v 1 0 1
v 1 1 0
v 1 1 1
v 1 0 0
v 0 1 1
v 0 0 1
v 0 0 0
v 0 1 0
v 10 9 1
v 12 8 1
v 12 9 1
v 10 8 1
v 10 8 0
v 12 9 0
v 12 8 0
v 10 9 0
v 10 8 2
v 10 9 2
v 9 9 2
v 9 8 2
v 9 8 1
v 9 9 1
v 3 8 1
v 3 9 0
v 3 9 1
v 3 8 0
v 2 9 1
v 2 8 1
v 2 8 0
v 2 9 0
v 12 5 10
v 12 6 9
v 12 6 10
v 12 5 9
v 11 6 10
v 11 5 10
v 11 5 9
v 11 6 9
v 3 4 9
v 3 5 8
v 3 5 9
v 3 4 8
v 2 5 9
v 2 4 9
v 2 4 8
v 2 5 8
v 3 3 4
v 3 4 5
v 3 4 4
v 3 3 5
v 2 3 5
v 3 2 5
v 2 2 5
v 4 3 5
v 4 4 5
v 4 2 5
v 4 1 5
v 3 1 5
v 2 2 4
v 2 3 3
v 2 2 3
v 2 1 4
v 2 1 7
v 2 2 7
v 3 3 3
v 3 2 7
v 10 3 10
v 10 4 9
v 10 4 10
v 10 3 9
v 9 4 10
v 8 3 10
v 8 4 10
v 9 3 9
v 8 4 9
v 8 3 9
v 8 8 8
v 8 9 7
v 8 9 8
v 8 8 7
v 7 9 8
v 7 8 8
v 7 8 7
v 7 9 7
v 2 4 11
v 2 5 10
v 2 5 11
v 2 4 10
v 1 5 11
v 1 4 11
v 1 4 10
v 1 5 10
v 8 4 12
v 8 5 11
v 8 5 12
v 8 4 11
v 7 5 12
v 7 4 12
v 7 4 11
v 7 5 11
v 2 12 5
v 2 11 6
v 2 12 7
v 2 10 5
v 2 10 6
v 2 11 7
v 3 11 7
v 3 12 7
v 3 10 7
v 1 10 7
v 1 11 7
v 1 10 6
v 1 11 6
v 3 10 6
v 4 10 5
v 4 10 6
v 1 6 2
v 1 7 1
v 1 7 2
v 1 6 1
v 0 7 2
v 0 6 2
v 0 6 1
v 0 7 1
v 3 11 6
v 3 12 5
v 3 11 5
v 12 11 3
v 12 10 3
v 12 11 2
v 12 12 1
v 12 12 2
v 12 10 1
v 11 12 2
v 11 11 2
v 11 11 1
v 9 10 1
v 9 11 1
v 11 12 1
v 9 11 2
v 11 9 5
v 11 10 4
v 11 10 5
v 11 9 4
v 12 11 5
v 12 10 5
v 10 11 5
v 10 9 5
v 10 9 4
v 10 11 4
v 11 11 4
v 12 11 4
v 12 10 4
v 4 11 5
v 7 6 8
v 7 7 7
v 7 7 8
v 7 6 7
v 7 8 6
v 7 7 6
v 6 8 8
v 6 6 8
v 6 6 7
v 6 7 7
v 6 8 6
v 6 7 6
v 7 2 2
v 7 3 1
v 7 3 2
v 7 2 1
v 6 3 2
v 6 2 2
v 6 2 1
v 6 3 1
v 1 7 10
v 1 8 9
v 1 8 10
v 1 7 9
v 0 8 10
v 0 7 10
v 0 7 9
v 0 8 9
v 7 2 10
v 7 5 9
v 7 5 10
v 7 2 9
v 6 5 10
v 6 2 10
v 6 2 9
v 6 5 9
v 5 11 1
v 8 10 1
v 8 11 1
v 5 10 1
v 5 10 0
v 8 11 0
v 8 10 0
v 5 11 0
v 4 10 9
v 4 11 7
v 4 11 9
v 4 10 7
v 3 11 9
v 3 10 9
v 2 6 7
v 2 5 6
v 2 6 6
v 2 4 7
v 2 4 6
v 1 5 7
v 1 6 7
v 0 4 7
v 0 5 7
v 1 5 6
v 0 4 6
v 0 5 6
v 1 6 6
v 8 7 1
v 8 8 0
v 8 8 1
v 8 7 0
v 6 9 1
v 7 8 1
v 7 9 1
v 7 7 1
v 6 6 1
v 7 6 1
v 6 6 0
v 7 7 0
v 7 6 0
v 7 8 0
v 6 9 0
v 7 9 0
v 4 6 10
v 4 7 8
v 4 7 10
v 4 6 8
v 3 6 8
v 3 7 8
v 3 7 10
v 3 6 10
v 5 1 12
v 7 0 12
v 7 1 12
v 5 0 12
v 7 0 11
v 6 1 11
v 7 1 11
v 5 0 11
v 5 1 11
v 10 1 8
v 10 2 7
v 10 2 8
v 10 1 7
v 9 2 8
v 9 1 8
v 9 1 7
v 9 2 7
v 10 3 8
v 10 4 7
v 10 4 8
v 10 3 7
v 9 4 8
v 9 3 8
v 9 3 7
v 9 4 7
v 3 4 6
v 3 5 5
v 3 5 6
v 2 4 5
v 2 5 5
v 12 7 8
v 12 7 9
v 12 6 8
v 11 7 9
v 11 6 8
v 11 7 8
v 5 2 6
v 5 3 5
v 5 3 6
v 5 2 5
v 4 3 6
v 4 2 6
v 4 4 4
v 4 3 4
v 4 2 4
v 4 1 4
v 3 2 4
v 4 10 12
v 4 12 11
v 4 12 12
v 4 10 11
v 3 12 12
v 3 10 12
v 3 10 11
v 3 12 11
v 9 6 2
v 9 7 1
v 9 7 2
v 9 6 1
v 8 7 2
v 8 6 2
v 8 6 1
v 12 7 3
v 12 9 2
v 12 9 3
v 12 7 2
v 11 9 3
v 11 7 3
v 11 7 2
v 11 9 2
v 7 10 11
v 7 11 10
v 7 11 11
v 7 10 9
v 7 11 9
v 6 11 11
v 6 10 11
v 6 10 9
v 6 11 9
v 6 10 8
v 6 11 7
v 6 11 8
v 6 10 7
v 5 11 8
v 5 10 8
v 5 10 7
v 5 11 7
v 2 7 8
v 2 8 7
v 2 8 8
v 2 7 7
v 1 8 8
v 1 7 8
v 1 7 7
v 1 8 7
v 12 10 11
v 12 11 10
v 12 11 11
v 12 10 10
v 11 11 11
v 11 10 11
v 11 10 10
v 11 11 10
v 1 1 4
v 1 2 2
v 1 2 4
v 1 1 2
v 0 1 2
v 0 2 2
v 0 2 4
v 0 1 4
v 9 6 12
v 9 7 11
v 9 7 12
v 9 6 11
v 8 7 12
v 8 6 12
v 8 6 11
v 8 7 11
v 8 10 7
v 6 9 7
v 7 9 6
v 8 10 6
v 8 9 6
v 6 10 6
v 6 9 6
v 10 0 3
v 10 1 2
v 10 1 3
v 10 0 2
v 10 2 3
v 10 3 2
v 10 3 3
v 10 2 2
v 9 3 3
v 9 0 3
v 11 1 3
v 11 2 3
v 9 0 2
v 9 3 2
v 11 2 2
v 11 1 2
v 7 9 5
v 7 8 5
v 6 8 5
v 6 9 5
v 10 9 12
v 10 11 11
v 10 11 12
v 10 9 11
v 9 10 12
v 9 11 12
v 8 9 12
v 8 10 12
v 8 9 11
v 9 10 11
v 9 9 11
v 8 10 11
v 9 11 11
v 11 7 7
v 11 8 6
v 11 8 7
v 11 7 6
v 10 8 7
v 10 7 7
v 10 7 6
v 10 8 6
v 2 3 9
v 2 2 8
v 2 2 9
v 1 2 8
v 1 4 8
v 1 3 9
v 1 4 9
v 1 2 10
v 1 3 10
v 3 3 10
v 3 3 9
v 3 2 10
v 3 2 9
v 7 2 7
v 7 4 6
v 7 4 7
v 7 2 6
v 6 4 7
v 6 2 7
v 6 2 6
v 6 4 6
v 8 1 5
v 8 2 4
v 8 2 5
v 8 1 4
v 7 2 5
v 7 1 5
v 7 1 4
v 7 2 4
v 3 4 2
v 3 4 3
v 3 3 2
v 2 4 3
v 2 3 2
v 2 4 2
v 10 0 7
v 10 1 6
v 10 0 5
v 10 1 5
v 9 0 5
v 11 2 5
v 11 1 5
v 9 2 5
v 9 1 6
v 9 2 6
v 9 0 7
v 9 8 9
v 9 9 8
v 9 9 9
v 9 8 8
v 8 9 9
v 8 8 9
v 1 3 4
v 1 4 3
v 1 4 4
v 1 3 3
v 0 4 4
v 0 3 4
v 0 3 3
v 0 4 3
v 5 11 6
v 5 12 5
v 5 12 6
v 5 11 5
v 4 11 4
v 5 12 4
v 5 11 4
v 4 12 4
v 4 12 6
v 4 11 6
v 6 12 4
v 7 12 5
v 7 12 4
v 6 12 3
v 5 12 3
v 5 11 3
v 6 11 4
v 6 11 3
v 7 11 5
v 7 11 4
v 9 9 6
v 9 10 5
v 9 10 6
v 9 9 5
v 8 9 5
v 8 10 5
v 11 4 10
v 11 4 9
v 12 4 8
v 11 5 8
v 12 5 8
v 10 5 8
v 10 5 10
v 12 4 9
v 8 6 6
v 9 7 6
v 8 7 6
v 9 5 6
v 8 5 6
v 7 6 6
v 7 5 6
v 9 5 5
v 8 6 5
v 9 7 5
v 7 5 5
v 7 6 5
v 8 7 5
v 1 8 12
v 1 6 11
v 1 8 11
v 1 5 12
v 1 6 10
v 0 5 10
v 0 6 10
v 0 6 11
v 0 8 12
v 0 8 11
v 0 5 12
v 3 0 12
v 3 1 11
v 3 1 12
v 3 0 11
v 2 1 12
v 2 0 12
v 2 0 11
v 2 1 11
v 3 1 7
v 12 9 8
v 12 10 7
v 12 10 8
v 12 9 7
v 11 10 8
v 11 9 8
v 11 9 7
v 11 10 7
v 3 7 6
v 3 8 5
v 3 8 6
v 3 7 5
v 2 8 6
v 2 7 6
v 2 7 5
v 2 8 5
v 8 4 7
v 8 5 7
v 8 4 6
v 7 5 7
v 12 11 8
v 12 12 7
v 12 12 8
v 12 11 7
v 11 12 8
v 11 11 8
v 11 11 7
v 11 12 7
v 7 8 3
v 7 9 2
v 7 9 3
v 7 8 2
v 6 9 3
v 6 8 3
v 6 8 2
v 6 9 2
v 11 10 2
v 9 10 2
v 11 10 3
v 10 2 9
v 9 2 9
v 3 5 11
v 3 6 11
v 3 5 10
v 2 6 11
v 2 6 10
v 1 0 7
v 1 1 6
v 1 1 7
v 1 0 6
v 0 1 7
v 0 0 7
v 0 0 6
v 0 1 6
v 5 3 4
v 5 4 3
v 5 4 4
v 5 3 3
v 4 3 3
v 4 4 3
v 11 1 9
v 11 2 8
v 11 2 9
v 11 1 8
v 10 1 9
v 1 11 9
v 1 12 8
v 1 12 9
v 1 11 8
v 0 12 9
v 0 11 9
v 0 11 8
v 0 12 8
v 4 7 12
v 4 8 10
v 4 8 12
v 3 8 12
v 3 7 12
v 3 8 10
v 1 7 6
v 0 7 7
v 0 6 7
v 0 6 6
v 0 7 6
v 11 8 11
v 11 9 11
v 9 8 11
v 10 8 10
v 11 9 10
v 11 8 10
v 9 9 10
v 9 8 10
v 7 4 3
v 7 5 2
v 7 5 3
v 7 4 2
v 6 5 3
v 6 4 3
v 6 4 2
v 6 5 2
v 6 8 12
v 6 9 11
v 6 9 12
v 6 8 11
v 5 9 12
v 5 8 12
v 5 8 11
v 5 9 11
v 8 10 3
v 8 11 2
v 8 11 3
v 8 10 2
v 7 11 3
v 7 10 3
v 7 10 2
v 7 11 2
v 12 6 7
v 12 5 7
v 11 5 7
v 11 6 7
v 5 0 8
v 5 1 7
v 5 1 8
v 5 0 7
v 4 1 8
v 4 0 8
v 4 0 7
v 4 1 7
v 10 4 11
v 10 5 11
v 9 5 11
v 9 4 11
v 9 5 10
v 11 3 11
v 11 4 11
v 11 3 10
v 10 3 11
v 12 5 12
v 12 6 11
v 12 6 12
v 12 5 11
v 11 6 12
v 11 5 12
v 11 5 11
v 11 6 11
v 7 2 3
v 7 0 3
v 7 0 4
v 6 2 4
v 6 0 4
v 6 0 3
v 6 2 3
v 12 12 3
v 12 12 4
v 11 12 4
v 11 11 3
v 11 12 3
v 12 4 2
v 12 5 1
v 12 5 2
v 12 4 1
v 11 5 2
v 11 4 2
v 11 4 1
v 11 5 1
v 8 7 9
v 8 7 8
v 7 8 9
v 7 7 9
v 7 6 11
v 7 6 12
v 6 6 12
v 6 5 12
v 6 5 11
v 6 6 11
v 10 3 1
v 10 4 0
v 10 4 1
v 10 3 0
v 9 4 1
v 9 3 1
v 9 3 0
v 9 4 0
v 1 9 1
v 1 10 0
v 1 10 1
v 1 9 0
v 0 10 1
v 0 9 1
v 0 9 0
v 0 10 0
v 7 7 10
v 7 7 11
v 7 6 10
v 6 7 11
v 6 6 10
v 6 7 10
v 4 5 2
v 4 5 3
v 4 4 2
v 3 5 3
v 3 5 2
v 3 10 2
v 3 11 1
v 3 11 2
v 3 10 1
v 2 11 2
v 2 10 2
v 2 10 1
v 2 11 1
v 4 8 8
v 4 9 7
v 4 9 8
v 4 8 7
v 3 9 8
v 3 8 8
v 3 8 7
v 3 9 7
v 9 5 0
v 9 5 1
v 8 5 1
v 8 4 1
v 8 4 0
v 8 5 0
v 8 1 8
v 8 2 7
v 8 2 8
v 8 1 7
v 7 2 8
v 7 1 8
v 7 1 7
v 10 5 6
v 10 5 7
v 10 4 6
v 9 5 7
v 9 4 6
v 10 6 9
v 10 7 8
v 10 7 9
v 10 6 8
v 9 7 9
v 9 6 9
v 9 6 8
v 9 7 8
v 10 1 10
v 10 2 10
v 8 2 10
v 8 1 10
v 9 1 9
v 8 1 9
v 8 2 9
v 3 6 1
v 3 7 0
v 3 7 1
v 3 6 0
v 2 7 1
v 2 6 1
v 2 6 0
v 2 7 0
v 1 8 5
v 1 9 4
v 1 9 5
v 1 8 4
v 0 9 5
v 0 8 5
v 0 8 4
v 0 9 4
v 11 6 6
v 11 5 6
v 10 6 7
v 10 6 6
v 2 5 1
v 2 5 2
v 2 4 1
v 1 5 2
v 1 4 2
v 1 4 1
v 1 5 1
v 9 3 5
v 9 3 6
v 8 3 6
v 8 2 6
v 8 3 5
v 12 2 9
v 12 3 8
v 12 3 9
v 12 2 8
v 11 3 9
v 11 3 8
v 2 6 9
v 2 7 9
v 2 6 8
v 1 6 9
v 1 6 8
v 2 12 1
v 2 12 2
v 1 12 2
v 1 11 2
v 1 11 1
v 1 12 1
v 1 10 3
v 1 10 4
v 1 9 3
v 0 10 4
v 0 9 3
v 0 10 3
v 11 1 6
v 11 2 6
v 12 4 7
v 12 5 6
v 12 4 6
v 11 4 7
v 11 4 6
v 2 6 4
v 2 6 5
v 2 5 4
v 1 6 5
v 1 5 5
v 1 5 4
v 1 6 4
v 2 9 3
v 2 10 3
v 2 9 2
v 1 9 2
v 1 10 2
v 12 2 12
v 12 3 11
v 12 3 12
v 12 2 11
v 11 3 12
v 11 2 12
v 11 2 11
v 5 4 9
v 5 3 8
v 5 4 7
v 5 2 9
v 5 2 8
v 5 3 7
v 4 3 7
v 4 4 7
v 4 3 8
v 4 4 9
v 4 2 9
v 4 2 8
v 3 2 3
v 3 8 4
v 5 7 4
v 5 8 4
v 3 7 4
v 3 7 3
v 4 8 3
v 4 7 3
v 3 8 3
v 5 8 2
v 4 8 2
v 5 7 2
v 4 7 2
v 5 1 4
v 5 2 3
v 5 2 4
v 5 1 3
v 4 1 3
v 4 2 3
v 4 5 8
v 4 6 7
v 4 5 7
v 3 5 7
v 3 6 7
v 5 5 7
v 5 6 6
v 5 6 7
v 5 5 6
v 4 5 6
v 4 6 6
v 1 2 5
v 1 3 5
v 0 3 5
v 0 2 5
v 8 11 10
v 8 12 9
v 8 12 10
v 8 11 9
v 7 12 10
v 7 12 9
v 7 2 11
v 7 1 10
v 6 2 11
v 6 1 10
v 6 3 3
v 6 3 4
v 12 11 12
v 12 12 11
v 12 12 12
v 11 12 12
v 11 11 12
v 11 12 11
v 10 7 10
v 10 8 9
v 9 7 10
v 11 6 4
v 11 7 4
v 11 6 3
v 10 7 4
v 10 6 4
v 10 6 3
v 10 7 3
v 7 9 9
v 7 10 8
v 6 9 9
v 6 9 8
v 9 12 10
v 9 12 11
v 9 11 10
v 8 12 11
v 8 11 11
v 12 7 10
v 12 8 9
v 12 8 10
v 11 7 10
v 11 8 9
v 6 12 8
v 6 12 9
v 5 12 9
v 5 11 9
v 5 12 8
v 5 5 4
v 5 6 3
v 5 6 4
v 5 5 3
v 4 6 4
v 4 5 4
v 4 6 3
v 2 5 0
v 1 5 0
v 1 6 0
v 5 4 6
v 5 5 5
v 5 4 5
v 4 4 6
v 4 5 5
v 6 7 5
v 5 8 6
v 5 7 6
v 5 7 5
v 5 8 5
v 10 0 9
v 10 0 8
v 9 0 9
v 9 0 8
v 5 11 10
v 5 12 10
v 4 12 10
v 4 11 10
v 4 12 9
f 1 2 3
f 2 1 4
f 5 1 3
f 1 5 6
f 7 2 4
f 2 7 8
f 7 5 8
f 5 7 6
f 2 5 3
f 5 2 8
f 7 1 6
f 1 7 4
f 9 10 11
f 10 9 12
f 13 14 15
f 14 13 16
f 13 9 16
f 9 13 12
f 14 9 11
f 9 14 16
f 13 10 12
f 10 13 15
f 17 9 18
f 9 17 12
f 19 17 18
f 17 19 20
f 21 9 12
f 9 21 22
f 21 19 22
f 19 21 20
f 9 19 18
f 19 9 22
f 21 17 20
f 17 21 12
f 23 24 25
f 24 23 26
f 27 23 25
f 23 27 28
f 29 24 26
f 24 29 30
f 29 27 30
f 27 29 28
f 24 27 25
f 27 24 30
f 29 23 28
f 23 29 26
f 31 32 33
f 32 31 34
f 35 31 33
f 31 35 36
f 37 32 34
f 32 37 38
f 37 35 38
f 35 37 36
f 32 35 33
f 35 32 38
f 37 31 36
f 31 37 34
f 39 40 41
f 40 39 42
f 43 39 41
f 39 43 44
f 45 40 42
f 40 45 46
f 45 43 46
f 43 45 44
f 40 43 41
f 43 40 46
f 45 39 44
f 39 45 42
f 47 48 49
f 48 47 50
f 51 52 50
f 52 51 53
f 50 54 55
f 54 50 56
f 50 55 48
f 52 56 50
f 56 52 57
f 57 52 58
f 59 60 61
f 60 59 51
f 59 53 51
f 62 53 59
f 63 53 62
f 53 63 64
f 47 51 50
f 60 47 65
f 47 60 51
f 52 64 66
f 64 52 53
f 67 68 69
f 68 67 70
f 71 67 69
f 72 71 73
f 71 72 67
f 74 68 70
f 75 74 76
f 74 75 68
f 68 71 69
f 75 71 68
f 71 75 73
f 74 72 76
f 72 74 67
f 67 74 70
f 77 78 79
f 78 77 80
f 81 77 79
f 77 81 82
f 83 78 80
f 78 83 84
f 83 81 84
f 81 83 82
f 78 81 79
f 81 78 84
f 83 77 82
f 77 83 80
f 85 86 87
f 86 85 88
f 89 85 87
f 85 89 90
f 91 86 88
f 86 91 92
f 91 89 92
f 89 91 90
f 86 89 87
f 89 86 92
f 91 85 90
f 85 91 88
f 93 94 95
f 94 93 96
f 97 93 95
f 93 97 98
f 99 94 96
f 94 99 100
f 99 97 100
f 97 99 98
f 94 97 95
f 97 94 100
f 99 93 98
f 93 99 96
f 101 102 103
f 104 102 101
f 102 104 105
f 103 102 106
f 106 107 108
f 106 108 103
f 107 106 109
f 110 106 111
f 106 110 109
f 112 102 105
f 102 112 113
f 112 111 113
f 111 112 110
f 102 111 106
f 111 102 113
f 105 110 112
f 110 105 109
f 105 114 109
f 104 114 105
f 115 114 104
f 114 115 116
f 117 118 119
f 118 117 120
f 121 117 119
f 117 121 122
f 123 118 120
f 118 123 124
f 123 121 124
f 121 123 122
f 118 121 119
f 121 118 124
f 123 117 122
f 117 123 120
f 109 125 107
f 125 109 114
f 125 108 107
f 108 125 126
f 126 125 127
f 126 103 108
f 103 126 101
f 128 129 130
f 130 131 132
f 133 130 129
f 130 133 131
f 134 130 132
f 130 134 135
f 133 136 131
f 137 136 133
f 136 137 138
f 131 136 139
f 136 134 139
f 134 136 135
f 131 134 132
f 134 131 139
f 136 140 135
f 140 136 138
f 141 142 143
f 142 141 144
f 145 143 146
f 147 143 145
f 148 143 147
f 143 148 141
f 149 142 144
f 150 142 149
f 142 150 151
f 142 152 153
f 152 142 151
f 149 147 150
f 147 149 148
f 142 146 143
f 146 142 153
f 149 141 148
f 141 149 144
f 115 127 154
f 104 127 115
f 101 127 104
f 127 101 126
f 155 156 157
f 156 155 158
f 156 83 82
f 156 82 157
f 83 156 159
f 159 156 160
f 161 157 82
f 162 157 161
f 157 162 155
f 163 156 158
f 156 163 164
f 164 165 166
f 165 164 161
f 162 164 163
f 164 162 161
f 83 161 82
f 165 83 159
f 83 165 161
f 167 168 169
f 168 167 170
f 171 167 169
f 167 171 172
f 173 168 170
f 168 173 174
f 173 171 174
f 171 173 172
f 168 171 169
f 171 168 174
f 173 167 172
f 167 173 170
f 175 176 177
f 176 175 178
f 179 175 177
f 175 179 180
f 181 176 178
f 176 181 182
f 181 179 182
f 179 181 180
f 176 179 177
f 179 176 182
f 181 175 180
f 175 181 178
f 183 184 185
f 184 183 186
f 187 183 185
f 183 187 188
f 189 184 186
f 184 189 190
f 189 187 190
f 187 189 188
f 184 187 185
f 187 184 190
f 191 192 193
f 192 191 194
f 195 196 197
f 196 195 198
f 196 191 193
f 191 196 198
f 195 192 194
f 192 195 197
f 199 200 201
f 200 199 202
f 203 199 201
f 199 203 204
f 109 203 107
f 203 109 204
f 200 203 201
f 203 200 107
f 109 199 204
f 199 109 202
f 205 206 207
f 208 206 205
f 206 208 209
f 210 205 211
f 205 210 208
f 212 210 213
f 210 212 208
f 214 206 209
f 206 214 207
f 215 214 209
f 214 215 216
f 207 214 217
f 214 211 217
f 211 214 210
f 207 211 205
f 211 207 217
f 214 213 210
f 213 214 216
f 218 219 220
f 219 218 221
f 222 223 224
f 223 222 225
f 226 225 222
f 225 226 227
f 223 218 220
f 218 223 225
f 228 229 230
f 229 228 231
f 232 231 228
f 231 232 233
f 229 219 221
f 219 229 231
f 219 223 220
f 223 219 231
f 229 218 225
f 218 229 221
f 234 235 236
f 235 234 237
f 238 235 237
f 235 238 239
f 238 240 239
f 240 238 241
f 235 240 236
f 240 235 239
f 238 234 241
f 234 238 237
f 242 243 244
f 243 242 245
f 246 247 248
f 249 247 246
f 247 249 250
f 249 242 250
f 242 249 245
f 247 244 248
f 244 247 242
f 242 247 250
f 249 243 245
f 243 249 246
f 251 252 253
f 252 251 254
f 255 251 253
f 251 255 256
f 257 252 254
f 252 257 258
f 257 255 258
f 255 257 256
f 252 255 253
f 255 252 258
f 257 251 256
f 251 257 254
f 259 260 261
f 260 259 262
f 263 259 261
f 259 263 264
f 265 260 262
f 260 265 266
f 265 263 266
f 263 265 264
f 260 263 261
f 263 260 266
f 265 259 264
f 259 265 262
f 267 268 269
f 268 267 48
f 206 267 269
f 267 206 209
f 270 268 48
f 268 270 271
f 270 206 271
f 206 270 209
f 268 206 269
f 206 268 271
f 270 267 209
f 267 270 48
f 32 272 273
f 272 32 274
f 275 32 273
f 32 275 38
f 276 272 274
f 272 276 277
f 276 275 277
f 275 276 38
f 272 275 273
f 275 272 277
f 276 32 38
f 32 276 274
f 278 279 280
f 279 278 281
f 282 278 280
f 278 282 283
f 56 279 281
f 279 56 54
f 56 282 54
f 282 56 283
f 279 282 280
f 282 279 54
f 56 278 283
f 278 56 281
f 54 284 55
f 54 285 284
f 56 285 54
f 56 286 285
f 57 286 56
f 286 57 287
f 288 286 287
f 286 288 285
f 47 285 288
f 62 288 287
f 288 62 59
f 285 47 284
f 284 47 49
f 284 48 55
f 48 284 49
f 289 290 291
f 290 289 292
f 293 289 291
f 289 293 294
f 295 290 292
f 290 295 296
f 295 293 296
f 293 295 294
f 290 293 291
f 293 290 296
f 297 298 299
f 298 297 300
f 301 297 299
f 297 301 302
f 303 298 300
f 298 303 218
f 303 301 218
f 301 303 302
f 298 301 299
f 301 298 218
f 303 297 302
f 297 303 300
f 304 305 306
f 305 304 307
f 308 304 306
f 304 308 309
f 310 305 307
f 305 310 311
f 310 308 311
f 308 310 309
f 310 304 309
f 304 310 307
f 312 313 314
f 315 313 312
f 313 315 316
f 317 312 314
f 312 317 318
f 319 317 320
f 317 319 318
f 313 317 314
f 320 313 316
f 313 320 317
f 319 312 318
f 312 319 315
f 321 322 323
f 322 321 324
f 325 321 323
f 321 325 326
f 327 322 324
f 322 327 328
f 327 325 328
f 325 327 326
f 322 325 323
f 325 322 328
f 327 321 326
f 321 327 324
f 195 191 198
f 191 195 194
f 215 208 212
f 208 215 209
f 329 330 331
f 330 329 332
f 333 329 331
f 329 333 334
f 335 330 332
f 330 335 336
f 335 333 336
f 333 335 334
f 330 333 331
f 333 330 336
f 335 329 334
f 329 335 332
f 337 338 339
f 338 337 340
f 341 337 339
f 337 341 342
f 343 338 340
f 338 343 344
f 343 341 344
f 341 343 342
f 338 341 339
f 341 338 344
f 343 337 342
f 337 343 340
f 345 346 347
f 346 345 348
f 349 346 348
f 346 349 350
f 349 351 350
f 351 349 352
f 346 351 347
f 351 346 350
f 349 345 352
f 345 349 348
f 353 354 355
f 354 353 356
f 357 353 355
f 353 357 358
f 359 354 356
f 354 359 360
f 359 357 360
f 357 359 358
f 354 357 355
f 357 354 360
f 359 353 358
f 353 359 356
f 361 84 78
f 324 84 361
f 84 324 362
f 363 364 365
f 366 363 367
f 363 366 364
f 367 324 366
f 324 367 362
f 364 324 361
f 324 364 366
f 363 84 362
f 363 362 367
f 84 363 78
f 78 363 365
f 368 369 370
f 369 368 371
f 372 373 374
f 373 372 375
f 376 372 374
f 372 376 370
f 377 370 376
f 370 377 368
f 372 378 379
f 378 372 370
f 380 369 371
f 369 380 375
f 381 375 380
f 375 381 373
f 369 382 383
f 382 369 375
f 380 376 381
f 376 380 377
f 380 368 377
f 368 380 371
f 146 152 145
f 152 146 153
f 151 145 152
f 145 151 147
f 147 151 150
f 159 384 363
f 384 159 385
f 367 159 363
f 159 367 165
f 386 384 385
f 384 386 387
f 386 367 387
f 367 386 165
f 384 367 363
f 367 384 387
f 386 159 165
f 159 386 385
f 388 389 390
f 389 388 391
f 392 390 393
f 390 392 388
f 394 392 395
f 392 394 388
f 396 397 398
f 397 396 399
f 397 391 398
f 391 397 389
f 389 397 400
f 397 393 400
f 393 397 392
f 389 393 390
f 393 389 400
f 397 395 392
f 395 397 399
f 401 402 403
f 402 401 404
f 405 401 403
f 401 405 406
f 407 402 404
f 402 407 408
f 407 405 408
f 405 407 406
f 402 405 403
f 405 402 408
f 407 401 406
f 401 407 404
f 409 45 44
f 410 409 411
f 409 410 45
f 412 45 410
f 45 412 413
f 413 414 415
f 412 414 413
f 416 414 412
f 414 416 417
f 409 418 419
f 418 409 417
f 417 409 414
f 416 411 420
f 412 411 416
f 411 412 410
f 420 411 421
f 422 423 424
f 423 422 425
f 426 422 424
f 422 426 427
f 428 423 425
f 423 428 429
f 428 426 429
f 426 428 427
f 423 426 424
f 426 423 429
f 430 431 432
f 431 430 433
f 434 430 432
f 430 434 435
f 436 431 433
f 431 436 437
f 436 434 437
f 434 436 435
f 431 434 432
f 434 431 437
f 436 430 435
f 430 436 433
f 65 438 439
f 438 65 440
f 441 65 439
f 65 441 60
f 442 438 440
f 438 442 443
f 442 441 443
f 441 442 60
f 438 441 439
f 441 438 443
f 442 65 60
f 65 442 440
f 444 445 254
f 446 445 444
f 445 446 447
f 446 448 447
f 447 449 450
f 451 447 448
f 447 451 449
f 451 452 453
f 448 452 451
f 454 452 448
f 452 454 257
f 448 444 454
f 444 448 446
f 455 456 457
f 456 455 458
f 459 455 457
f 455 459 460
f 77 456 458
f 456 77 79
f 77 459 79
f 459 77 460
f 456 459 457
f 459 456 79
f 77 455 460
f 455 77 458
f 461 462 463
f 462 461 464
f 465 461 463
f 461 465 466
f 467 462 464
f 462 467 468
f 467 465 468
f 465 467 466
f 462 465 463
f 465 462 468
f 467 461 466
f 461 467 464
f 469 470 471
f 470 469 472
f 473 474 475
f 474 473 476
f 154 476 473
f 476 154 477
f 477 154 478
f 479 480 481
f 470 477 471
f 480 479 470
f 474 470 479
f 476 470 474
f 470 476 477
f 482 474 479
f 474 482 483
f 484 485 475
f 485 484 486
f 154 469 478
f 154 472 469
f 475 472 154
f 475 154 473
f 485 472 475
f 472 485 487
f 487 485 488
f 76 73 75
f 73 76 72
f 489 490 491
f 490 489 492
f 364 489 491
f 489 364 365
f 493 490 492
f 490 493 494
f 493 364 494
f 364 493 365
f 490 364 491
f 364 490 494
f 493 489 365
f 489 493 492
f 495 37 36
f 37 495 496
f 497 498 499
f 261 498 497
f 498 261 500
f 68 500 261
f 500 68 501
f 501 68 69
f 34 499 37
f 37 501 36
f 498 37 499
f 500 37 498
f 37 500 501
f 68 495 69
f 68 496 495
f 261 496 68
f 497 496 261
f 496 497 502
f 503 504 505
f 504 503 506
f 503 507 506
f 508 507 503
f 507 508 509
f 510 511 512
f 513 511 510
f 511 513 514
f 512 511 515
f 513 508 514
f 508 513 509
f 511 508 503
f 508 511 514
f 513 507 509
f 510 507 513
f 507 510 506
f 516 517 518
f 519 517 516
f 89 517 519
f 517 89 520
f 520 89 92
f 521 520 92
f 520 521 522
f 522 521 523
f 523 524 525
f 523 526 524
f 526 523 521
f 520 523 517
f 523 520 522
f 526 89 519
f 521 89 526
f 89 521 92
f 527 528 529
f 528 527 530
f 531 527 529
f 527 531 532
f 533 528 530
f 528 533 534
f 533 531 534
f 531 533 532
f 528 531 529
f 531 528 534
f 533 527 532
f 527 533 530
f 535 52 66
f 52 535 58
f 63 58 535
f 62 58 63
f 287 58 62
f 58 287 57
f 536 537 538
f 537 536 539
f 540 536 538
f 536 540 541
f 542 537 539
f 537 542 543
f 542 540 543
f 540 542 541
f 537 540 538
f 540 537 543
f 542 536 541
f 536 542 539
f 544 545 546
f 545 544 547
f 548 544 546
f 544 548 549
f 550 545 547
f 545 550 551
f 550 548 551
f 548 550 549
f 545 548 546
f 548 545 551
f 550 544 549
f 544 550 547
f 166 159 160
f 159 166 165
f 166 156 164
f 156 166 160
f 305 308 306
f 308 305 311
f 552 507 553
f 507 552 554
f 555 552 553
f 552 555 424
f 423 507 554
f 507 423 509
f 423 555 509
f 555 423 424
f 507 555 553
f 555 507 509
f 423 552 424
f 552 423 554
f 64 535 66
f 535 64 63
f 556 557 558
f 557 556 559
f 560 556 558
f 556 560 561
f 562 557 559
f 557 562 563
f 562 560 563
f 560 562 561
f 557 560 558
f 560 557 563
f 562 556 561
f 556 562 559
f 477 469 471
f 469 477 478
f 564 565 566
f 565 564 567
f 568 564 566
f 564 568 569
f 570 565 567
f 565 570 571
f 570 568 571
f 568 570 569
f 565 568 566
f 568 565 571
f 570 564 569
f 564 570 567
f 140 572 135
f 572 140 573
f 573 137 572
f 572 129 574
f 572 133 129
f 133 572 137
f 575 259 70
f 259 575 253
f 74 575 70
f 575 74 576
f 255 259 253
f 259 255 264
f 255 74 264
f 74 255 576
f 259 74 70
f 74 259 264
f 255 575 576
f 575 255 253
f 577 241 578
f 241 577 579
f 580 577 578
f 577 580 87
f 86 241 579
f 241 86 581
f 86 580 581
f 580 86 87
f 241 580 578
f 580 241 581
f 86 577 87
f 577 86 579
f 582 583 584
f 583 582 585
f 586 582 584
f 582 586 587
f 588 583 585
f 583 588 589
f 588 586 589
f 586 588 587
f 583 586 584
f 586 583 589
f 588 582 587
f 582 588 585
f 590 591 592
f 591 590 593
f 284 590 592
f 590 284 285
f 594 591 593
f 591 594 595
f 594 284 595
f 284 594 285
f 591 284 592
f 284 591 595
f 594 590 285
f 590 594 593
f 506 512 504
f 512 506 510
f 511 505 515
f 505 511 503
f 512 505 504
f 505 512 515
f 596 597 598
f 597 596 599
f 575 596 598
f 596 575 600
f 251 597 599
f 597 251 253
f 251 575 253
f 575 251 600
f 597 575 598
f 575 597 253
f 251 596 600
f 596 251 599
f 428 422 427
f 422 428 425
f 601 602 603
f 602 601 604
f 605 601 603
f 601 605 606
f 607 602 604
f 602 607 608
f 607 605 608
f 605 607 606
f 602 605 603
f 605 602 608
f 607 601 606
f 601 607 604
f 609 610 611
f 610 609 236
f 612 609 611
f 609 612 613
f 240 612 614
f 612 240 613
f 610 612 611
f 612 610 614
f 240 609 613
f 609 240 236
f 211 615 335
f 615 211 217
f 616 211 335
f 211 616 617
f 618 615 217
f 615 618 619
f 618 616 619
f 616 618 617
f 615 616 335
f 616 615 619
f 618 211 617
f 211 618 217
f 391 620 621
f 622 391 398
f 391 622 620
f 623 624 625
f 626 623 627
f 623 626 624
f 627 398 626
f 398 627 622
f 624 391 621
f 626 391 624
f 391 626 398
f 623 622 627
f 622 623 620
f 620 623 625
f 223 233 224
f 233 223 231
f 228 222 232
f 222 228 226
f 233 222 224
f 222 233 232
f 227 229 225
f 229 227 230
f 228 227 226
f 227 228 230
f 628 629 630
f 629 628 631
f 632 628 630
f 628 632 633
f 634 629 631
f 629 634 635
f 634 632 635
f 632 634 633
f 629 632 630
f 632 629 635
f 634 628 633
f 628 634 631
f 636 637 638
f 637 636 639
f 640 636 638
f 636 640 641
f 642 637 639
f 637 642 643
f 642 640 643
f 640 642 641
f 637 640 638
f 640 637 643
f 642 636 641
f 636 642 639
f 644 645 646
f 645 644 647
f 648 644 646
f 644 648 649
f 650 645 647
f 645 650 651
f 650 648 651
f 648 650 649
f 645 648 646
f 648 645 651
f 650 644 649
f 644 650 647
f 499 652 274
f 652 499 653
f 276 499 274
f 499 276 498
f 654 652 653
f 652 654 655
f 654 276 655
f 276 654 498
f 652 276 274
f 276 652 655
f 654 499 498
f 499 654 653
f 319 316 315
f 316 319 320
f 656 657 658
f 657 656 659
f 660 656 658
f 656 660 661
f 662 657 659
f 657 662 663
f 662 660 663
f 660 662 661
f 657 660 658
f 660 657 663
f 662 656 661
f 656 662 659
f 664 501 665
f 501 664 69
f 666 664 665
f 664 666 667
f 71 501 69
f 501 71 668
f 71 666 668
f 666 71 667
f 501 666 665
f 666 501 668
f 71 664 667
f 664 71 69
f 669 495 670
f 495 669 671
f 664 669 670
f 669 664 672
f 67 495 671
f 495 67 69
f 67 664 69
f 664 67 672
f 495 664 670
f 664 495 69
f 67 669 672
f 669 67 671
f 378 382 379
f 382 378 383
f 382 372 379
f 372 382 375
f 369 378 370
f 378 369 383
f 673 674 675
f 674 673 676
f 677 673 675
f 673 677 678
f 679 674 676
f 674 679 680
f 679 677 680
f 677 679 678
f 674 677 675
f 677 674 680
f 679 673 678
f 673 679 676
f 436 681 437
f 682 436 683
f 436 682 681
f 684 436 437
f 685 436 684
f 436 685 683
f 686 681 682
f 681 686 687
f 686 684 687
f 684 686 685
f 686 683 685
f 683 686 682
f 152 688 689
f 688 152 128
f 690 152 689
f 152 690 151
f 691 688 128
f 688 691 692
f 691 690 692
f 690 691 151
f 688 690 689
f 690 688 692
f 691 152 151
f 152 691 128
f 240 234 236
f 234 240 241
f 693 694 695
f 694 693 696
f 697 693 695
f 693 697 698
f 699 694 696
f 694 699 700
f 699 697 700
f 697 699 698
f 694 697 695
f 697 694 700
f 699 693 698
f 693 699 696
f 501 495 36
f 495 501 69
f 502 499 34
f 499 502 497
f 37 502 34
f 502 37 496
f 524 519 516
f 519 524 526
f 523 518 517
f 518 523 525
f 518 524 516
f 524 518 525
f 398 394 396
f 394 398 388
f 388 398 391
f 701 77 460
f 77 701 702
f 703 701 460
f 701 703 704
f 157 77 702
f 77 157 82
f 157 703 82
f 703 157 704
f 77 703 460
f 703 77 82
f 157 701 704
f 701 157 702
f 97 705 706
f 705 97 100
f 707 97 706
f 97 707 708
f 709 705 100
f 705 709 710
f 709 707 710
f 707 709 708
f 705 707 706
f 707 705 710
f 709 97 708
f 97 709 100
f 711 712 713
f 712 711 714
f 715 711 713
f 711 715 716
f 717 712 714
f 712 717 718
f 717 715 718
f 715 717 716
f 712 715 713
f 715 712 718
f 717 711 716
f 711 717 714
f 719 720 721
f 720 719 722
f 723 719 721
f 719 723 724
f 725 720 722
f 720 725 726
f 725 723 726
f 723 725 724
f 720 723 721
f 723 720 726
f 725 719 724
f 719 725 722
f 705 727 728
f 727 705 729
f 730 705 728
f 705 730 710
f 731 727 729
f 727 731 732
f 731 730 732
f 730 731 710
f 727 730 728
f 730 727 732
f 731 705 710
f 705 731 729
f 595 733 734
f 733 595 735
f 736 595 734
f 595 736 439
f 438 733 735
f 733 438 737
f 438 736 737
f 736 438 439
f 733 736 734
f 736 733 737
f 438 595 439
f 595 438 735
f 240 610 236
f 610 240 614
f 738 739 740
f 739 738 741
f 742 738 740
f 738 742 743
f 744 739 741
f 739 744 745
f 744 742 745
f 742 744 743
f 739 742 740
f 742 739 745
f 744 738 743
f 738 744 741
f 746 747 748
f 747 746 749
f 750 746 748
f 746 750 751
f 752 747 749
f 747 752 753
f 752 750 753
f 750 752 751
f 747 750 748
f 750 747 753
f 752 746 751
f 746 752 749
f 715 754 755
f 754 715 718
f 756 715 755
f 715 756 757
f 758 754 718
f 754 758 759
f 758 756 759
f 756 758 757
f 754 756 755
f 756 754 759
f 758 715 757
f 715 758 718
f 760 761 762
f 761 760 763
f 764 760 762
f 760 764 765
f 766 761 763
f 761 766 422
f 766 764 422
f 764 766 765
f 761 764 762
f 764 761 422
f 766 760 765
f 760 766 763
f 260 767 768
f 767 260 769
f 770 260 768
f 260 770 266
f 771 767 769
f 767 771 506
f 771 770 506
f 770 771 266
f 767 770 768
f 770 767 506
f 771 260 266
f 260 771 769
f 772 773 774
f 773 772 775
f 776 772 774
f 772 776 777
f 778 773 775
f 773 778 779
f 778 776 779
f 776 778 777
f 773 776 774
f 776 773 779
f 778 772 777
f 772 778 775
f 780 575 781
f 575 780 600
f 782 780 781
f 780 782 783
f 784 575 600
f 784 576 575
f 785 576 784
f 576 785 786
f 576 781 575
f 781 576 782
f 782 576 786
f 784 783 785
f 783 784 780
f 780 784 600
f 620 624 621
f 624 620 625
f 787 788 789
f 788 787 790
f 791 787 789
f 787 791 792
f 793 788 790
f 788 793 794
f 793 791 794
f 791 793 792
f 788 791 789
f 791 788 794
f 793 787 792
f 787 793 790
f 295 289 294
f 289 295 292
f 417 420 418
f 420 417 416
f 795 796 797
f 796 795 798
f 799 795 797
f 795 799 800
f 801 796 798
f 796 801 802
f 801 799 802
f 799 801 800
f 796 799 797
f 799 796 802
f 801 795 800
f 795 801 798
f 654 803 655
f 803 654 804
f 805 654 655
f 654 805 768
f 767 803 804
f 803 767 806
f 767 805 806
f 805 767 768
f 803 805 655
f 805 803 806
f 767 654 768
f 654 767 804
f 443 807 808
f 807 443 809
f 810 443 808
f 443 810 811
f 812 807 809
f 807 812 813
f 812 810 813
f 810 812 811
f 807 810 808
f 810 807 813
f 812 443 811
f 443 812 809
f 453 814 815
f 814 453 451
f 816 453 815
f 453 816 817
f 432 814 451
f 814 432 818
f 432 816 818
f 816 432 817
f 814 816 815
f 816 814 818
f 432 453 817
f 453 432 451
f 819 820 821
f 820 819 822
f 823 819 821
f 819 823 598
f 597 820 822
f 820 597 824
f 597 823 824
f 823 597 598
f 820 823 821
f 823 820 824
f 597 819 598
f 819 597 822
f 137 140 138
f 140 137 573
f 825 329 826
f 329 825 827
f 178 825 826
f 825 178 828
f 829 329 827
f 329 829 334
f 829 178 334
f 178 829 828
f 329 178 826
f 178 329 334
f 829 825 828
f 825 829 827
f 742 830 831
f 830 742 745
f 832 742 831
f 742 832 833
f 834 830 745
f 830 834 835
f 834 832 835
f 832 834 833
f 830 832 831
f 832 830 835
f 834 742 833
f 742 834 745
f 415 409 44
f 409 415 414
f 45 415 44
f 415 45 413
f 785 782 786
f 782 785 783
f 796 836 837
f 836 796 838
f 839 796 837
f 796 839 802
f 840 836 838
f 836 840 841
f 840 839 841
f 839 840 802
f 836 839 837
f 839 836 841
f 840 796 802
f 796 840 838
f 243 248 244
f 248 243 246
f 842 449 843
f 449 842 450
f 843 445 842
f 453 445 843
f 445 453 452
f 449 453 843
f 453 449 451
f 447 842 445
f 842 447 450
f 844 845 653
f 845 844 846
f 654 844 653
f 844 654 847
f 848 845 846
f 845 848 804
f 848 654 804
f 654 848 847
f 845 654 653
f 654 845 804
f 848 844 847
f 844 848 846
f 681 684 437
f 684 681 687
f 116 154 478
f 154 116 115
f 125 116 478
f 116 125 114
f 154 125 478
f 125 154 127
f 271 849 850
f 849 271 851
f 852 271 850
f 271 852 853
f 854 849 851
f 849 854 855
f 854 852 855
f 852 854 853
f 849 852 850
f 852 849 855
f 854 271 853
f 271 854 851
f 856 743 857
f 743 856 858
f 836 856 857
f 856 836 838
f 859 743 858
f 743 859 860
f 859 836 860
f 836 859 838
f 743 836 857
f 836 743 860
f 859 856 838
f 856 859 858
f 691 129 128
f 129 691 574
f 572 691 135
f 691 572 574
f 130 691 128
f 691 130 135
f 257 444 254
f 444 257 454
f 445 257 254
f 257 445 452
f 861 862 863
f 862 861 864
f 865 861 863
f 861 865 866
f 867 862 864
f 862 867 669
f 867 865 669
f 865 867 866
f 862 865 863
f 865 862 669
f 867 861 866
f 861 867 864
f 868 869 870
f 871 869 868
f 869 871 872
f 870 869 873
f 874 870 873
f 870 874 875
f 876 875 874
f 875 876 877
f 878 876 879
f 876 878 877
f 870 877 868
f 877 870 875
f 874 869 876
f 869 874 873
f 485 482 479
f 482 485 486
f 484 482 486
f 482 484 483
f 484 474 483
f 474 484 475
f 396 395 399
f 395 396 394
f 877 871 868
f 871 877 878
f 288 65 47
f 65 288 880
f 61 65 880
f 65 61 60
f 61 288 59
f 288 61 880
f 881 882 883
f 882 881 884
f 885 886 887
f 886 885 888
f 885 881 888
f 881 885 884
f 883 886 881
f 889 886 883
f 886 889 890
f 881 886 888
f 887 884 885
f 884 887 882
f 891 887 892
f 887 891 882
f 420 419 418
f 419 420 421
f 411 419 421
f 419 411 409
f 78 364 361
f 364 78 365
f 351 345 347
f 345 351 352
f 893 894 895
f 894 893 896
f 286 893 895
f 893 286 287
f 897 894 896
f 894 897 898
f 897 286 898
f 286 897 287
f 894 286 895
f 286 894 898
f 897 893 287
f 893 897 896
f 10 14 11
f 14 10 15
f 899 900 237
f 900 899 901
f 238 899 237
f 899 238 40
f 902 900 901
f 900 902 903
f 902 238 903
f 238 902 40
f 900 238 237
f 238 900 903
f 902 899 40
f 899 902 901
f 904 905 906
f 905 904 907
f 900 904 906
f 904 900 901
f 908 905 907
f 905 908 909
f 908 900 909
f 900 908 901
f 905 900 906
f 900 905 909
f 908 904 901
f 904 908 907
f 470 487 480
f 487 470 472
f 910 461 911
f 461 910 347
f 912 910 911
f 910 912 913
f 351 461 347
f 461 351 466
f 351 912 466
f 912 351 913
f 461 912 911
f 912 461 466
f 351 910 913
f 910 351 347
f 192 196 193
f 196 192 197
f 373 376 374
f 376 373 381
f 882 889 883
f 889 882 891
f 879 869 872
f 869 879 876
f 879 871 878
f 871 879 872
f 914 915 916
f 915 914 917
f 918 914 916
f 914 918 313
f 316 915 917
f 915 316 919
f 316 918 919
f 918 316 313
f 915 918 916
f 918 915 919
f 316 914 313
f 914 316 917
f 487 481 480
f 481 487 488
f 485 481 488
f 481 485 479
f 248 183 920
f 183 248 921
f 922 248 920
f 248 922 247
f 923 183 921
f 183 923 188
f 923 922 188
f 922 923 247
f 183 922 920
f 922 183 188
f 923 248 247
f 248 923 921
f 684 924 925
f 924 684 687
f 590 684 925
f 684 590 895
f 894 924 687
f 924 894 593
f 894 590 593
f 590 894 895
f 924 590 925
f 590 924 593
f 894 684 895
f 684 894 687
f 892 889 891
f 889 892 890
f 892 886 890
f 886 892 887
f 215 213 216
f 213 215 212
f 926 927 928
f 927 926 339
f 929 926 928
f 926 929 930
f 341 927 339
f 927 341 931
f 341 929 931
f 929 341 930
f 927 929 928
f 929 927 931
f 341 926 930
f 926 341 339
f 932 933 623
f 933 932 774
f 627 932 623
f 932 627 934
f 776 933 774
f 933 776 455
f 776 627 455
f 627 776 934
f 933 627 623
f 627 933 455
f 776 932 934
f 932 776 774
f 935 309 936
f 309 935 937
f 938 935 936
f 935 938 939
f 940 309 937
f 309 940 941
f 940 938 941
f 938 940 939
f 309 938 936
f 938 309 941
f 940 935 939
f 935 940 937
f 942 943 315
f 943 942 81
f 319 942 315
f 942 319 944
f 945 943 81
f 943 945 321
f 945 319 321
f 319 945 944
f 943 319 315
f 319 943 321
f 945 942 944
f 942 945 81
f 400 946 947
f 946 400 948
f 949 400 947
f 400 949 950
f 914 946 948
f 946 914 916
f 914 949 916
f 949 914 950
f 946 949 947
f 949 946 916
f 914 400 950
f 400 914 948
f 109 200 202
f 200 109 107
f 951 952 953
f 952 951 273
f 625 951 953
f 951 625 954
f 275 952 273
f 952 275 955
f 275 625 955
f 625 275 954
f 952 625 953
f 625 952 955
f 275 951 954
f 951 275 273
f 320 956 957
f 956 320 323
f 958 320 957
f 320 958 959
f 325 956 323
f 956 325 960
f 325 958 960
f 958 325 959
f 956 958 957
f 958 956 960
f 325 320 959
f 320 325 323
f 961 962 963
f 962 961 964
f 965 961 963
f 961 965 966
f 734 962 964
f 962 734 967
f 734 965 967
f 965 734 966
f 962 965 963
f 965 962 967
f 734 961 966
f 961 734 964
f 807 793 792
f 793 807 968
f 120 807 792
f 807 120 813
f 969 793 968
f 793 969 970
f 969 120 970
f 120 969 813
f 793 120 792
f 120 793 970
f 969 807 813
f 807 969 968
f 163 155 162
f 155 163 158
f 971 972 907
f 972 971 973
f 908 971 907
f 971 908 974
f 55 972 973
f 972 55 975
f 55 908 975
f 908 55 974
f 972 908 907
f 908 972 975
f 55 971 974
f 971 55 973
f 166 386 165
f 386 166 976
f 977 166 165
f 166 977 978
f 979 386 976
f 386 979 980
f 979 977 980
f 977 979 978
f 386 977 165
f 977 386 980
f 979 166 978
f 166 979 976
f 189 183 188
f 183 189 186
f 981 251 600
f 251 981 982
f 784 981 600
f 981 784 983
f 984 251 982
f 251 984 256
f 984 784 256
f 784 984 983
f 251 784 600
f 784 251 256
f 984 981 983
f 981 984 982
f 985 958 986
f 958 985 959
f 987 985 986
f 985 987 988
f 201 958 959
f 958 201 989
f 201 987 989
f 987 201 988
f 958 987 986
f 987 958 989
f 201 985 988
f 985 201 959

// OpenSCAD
union() {
    translate([0, 0, 0]) cube([1, 1, 1]);
    translate([10, 8, 0]) cube([1, 1, 1]);
    translate([9, 8, 1]) cube([1, 1, 1]);
    translate([2, 8, 0]) cube([1, 1, 1]);
    translate([11, 5, 9]) cube([1, 1, 1]);
    translate([2, 4, 8]) cube([1, 1, 1]);
    translate([2, 2, 4]) cube([1, 1, 1]);
    translate([9, 3, 9]) cube([1, 1, 1]);
    translate([7, 8, 7]) cube([1, 1, 1]);
    translate([1, 4, 10]) cube([1, 1, 1]);
    translate([7, 4, 11]) cube([1, 1, 1]);
    translate([1, 10, 6]) cube([1, 1, 1]);
    translate([0, 6, 1]) cube([1, 1, 1]);
    translate([2, 11, 6]) cube([1, 1, 1]);
    translate([11, 11, 1]) cube([1, 1, 1]);
    translate([10, 9, 4]) cube([1, 1, 1]);
    translate([2, 10, 5]) cube([1, 1, 1]);
    translate([6, 7, 7]) cube([1, 1, 1]);
    translate([6, 2, 1]) cube([1, 1, 1]);
    translate([0, 7, 9]) cube([1, 1, 1]);
    translate([6, 4, 9]) cube([1, 1, 1]);
    translate([6, 10, 0]) cube([1, 1, 1]);
    translate([3, 10, 8]) cube([1, 1, 1]);
    translate([1, 5, 6]) cube([1, 1, 1]);
    translate([7, 7, 0]) cube([1, 1, 1]);
    translate([3, 6, 8]) cube([1, 1, 1]);
    translate([5, 0, 11]) cube([1, 1, 1]);
    translate([9, 1, 7]) cube([1, 1, 1]);
    translate([9, 3, 7]) cube([1, 1, 1]);
    translate([2, 4, 5]) cube([1, 1, 1]);
    translate([11, 6, 8]) cube([1, 1, 1]);
    translate([4, 2, 5]) cube([1, 1, 1]);
    translate([3, 3, 4]) cube([1, 1, 1]);
    translate([3, 11, 11]) cube([1, 1, 1]);
    translate([6, 3, 9]) cube([1, 1, 1]);
    translate([8, 6, 1]) cube([1, 1, 1]);
    translate([11, 7, 2]) cube([1, 1, 1]);
    translate([6, 10, 10]) cube([1, 1, 1]);
    translate([5, 10, 7]) cube([1, 1, 1]);
    translate([5, 10, 0]) cube([1, 1, 1]);
    translate([1, 4, 6]) cube([1, 1, 1]);
    translate([1, 7, 7]) cube([1, 1, 1]);
    translate([11, 10, 10]) cube([1, 1, 1]);
    translate([0, 1, 2]) cube([1, 1, 1]);
    translate([8, 6, 11]) cube([1, 1, 1]);
    translate([6, 9, 6]) cube([1, 1, 1]);
    translate([9, 0, 2]) cube([1, 1, 1]);
    translate([11, 10, 4]) cube([1, 1, 1]);
    translate([6, 8, 5]) cube([1, 1, 1]);
    translate([9, 10, 11]) cube([1, 1, 1]);
    translate([10, 7, 6]) cube([1, 1, 1]);
    translate([1, 2, 8]) cube([1, 1, 1]);
    translate([6, 3, 6]) cube([1, 1, 1]);
    translate([7, 1, 4]) cube([1, 1, 1]);
    translate([2, 3, 2]) cube([1, 1, 1]);
    translate([9, 0, 5]) cube([1, 1, 1]);
    translate([8, 8, 8]) cube([1, 1, 1]);
    translate([0, 3, 3]) cube([1, 1, 1]);
    translate([4, 11, 4]) cube([1, 1, 1]);
    translate([8, 3, 9]) cube([1, 1, 1]);
    translate([8, 9, 5]) cube([1, 1, 1]);
    translate([10, 4, 8]) cube([1, 1, 1]);
    translate([7, 5, 5]) cube([1, 1, 1]);
    translate([0, 5, 10]) cube([1, 1, 1]);
    translate([2, 0, 11]) cube([1, 1, 1]);
    translate([3, 1, 4]) cube([1, 1, 1]);
    translate([11, 9, 7]) cube([1, 1, 1]);
    translate([2, 7, 5]) cube([1, 1, 1]);
    translate([6, 7, 6]) cube([1, 1, 1]);
    translate([11, 8, 2]) cube([1, 1, 1]);
    translate([2, 11, 5]) cube([1, 1, 1]);
    translate([7, 4, 6]) cube([1, 1, 1]);
    translate([2, 1, 6]) cube([1, 1, 1]);
    translate([11, 11, 7]) cube([1, 1, 1]);
    translate([4, 11, 5]) cube([1, 1, 1]);
    translate([6, 8, 2]) cube([1, 1, 1]);
    translate([11, 10, 1]) cube([1, 1, 1]);
    translate([9, 2, 8]) cube([1, 1, 1]);
    translate([2, 5, 10]) cube([1, 1, 1]);
    translate([0, 0, 6]) cube([1, 1, 1]);
    translate([4, 3, 3]) cube([1, 1, 1]);
    translate([8, 6, 5]) cube([1, 1, 1]);
    translate([10, 1, 8]) cube([1, 1, 1]);
    translate([6, 2, 6]) cube([1, 1, 1]);
    translate([0, 11, 8]) cube([1, 1, 1]);
    translate([3, 7, 11]) cube([1, 1, 1]);
    translate([0, 6, 6]) cube([1, 1, 1]);
    translate([9, 8, 10]) cube([1, 1, 1]);
    translate([6, 8, 0]) cube([1, 1, 1]);
    translate([6, 6, 0]) cube([1, 1, 1]);
    translate([6, 4, 2]) cube([1, 1, 1]);
    translate([5, 8, 11]) cube([1, 1, 1]);
    translate([7, 10, 2]) cube([1, 1, 1]);
    translate([11, 5, 7]) cube([1, 1, 1]);
    translate([9, 1, 2]) cube([1, 1, 1]);
    translate([10, 10, 1]) cube([1, 1, 1]);
    translate([6, 10, 9]) cube([1, 1, 1]);
    translate([4, 0, 7]) cube([1, 1, 1]);
    translate([9, 4, 10]) cube([1, 1, 1]);
    translate([2, 1, 4]) cube([1, 1, 1]);
    translate([10, 3, 10]) cube([1, 1, 1]);
    translate([10, 1, 2]) cube([1, 1, 1]);
    translate([11, 5, 11]) cube([1, 1, 1]);
    translate([6, 0, 3]) cube([1, 1, 1]);
    translate([11, 11, 3]) cube([1, 1, 1]);
    translate([3, 6, 9]) cube([1, 1, 1]);
    translate([11, 4, 1]) cube([1, 1, 1]);
    translate([10, 4, 9]) cube([1, 1, 1]);
    translate([11, 4, 8]) cube([1, 1, 1]);
    translate([0, 7, 11]) cube([1, 1, 1]);
    translate([9, 9, 11]) cube([1, 1, 1]);
    translate([7, 7, 8]) cube([1, 1, 1]);
    translate([6, 5, 11]) cube([1, 1, 1]);
    translate([9, 3, 0]) cube([1, 1, 1]);
    translate([0, 9, 0]) cube([1, 1, 1]);
    translate([6, 6, 10]) cube([1, 1, 1]);
    translate([3, 4, 2]) cube([1, 1, 1]);
    translate([3, 7, 10]) cube([1, 1, 1]);
    translate([2, 10, 1]) cube([1, 1, 1]);
    translate([3, 8, 7]) cube([1, 1, 1]);
    translate([8, 5, 5]) cube([1, 1, 1]);
    translate([2, 10, 6]) cube([1, 1, 1]);
    translate([8, 4, 0]) cube([1, 1, 1]);
    translate([7, 1, 7]) cube([1, 1, 1]);
    translate([9, 4, 6]) cube([1, 1, 1]);
    translate([9, 6, 8]) cube([1, 1, 1]);
    translate([9, 1, 9]) cube([1, 1, 1]);
    translate([10, 8, 10]) cube([1, 1, 1]);
    translate([0, 6, 11]) cube([1, 1, 1]);
    translate([2, 6, 0]) cube([1, 1, 1]);
    translate([3, 10, 11]) cube([1, 1, 1]);
    translate([1, 2, 9]) cube([1, 1, 1]);
    translate([0, 8, 4]) cube([1, 1, 1]);
    translate([10, 5, 6]) cube([1, 1, 1]);
    translate([1, 4, 1]) cube([1, 1, 1]);
    translate([8, 2, 5]) cube([1, 1, 1]);
    translate([11, 2, 8]) cube([1, 1, 1]);
    translate([9, 10, 1]) cube([1, 1, 1]);
    translate([1, 6, 8]) cube([1, 1, 1]);
    translate([1, 11, 1]) cube([1, 1, 1]);
    translate([1, 3, 8]) cube([1, 1, 1]);
    translate([8, 1, 9]) cube([1, 1, 1]);
    translate([0, 9, 3]) cube([1, 1, 1]);
    translate([6, 0, 11]) cube([1, 1, 1]);
    translate([10, 1, 5]) cube([1, 1, 1]);
    translate([11, 4, 6]) cube([1, 1, 1]);
    translate([6, 1, 3]) cube([1, 1, 1]);
    translate([3, 10, 5]) cube([1, 1, 1]);
    translate([1, 5, 4]) cube([1, 1, 1]);
    translate([1, 9, 2]) cube([1, 1, 1]);
    translate([11, 10, 2]) cube([1, 1, 1]);
    translate([9, 0, 6]) cube([1, 1, 1]);
    translate([11, 2, 11]) cube([1, 1, 1]);
    translate([4, 3, 7]) cube([1, 1, 1]);
    translate([6, 7, 0]) cube([1, 1, 1]);
    translate([5, 11, 3]) cube([1, 1, 1]);
    translate([8, 9, 11]) cube([1, 1, 1]);
    translate([4, 3, 8]) cube([1, 1, 1]);
    translate([10, 10, 4]) cube([1, 1, 1]);
    translate([2, 2, 3]) cube([1, 1, 1]);
    translate([3, 7, 3]) cube([1, 1, 1]);
    translate([2, 2, 9]) cube([1, 1, 1]);
    translate([7, 9, 6]) cube([1, 1, 1]);
    translate([0, 1, 3]) cube([1, 1, 1]);
    translate([4, 1, 3]) cube([1, 1, 1]);
    translate([11, 8, 0]) cube([1, 1, 1]);
    translate([3, 5, 7]) cube([1, 1, 1]);
    translate([4, 5, 6]) cube([1, 1, 1]);
    translate([5, 11, 4]) cube([1, 1, 1]);
    translate([0, 2, 4]) cube([1, 1, 1]);
    translate([2, 1, 5]) cube([1, 1, 1]);
    translate([7, 10, 0]) cube([1, 1, 1]);
    translate([9, 2, 2]) cube([1, 1, 1]);
    translate([4, 7, 3]) cube([1, 1, 1]);
    translate([4, 2, 8]) cube([1, 1, 1]);
    translate([7, 11, 9]) cube([1, 1, 1]);
    translate([6, 11, 4]) cube([1, 1, 1]);
    translate([6, 1, 10]) cube([1, 1, 1]);
    translate([5, 2, 3]) cube([1, 1, 1]);
    translate([4, 7, 2]) cube([1, 1, 1]);
    translate([0, 4, 6]) cube([1, 1, 1]);
    translate([11, 11, 11]) cube([1, 1, 1]);
    translate([9, 7, 9]) cube([1, 1, 1]);
    translate([3, 2, 4]) cube([1, 1, 1]);
    translate([10, 6, 3]) cube([1, 1, 1]);
    translate([6, 9, 8]) cube([1, 1, 1]);
    translate([0, 5, 11]) cube([1, 1, 1]);
    translate([8, 11, 10]) cube([1, 1, 1]);
    translate([3, 10, 7]) cube([1, 1, 1]);
    translate([11, 7, 9]) cube([1, 1, 1]);
    translate([5, 11, 8]) cube([1, 1, 1]);
    translate([4, 5, 3]) cube([1, 1, 1]);
    translate([9, 1, 5]) cube([1, 1, 1]);
    translate([1, 5, 0]) cube([1, 1, 1]);
    translate([6, 6, 7]) cube([1, 1, 1]);
    translate([4, 4, 5]) cube([1, 1, 1]);
    translate([5, 7, 5]) cube([1, 1, 1]);
    translate([6, 2, 9]) cube([1, 1, 1]);
    translate([9, 0, 8]) cube([1, 1, 1]);
    translate([4, 11, 9]) cube([1, 1, 1]);
}
